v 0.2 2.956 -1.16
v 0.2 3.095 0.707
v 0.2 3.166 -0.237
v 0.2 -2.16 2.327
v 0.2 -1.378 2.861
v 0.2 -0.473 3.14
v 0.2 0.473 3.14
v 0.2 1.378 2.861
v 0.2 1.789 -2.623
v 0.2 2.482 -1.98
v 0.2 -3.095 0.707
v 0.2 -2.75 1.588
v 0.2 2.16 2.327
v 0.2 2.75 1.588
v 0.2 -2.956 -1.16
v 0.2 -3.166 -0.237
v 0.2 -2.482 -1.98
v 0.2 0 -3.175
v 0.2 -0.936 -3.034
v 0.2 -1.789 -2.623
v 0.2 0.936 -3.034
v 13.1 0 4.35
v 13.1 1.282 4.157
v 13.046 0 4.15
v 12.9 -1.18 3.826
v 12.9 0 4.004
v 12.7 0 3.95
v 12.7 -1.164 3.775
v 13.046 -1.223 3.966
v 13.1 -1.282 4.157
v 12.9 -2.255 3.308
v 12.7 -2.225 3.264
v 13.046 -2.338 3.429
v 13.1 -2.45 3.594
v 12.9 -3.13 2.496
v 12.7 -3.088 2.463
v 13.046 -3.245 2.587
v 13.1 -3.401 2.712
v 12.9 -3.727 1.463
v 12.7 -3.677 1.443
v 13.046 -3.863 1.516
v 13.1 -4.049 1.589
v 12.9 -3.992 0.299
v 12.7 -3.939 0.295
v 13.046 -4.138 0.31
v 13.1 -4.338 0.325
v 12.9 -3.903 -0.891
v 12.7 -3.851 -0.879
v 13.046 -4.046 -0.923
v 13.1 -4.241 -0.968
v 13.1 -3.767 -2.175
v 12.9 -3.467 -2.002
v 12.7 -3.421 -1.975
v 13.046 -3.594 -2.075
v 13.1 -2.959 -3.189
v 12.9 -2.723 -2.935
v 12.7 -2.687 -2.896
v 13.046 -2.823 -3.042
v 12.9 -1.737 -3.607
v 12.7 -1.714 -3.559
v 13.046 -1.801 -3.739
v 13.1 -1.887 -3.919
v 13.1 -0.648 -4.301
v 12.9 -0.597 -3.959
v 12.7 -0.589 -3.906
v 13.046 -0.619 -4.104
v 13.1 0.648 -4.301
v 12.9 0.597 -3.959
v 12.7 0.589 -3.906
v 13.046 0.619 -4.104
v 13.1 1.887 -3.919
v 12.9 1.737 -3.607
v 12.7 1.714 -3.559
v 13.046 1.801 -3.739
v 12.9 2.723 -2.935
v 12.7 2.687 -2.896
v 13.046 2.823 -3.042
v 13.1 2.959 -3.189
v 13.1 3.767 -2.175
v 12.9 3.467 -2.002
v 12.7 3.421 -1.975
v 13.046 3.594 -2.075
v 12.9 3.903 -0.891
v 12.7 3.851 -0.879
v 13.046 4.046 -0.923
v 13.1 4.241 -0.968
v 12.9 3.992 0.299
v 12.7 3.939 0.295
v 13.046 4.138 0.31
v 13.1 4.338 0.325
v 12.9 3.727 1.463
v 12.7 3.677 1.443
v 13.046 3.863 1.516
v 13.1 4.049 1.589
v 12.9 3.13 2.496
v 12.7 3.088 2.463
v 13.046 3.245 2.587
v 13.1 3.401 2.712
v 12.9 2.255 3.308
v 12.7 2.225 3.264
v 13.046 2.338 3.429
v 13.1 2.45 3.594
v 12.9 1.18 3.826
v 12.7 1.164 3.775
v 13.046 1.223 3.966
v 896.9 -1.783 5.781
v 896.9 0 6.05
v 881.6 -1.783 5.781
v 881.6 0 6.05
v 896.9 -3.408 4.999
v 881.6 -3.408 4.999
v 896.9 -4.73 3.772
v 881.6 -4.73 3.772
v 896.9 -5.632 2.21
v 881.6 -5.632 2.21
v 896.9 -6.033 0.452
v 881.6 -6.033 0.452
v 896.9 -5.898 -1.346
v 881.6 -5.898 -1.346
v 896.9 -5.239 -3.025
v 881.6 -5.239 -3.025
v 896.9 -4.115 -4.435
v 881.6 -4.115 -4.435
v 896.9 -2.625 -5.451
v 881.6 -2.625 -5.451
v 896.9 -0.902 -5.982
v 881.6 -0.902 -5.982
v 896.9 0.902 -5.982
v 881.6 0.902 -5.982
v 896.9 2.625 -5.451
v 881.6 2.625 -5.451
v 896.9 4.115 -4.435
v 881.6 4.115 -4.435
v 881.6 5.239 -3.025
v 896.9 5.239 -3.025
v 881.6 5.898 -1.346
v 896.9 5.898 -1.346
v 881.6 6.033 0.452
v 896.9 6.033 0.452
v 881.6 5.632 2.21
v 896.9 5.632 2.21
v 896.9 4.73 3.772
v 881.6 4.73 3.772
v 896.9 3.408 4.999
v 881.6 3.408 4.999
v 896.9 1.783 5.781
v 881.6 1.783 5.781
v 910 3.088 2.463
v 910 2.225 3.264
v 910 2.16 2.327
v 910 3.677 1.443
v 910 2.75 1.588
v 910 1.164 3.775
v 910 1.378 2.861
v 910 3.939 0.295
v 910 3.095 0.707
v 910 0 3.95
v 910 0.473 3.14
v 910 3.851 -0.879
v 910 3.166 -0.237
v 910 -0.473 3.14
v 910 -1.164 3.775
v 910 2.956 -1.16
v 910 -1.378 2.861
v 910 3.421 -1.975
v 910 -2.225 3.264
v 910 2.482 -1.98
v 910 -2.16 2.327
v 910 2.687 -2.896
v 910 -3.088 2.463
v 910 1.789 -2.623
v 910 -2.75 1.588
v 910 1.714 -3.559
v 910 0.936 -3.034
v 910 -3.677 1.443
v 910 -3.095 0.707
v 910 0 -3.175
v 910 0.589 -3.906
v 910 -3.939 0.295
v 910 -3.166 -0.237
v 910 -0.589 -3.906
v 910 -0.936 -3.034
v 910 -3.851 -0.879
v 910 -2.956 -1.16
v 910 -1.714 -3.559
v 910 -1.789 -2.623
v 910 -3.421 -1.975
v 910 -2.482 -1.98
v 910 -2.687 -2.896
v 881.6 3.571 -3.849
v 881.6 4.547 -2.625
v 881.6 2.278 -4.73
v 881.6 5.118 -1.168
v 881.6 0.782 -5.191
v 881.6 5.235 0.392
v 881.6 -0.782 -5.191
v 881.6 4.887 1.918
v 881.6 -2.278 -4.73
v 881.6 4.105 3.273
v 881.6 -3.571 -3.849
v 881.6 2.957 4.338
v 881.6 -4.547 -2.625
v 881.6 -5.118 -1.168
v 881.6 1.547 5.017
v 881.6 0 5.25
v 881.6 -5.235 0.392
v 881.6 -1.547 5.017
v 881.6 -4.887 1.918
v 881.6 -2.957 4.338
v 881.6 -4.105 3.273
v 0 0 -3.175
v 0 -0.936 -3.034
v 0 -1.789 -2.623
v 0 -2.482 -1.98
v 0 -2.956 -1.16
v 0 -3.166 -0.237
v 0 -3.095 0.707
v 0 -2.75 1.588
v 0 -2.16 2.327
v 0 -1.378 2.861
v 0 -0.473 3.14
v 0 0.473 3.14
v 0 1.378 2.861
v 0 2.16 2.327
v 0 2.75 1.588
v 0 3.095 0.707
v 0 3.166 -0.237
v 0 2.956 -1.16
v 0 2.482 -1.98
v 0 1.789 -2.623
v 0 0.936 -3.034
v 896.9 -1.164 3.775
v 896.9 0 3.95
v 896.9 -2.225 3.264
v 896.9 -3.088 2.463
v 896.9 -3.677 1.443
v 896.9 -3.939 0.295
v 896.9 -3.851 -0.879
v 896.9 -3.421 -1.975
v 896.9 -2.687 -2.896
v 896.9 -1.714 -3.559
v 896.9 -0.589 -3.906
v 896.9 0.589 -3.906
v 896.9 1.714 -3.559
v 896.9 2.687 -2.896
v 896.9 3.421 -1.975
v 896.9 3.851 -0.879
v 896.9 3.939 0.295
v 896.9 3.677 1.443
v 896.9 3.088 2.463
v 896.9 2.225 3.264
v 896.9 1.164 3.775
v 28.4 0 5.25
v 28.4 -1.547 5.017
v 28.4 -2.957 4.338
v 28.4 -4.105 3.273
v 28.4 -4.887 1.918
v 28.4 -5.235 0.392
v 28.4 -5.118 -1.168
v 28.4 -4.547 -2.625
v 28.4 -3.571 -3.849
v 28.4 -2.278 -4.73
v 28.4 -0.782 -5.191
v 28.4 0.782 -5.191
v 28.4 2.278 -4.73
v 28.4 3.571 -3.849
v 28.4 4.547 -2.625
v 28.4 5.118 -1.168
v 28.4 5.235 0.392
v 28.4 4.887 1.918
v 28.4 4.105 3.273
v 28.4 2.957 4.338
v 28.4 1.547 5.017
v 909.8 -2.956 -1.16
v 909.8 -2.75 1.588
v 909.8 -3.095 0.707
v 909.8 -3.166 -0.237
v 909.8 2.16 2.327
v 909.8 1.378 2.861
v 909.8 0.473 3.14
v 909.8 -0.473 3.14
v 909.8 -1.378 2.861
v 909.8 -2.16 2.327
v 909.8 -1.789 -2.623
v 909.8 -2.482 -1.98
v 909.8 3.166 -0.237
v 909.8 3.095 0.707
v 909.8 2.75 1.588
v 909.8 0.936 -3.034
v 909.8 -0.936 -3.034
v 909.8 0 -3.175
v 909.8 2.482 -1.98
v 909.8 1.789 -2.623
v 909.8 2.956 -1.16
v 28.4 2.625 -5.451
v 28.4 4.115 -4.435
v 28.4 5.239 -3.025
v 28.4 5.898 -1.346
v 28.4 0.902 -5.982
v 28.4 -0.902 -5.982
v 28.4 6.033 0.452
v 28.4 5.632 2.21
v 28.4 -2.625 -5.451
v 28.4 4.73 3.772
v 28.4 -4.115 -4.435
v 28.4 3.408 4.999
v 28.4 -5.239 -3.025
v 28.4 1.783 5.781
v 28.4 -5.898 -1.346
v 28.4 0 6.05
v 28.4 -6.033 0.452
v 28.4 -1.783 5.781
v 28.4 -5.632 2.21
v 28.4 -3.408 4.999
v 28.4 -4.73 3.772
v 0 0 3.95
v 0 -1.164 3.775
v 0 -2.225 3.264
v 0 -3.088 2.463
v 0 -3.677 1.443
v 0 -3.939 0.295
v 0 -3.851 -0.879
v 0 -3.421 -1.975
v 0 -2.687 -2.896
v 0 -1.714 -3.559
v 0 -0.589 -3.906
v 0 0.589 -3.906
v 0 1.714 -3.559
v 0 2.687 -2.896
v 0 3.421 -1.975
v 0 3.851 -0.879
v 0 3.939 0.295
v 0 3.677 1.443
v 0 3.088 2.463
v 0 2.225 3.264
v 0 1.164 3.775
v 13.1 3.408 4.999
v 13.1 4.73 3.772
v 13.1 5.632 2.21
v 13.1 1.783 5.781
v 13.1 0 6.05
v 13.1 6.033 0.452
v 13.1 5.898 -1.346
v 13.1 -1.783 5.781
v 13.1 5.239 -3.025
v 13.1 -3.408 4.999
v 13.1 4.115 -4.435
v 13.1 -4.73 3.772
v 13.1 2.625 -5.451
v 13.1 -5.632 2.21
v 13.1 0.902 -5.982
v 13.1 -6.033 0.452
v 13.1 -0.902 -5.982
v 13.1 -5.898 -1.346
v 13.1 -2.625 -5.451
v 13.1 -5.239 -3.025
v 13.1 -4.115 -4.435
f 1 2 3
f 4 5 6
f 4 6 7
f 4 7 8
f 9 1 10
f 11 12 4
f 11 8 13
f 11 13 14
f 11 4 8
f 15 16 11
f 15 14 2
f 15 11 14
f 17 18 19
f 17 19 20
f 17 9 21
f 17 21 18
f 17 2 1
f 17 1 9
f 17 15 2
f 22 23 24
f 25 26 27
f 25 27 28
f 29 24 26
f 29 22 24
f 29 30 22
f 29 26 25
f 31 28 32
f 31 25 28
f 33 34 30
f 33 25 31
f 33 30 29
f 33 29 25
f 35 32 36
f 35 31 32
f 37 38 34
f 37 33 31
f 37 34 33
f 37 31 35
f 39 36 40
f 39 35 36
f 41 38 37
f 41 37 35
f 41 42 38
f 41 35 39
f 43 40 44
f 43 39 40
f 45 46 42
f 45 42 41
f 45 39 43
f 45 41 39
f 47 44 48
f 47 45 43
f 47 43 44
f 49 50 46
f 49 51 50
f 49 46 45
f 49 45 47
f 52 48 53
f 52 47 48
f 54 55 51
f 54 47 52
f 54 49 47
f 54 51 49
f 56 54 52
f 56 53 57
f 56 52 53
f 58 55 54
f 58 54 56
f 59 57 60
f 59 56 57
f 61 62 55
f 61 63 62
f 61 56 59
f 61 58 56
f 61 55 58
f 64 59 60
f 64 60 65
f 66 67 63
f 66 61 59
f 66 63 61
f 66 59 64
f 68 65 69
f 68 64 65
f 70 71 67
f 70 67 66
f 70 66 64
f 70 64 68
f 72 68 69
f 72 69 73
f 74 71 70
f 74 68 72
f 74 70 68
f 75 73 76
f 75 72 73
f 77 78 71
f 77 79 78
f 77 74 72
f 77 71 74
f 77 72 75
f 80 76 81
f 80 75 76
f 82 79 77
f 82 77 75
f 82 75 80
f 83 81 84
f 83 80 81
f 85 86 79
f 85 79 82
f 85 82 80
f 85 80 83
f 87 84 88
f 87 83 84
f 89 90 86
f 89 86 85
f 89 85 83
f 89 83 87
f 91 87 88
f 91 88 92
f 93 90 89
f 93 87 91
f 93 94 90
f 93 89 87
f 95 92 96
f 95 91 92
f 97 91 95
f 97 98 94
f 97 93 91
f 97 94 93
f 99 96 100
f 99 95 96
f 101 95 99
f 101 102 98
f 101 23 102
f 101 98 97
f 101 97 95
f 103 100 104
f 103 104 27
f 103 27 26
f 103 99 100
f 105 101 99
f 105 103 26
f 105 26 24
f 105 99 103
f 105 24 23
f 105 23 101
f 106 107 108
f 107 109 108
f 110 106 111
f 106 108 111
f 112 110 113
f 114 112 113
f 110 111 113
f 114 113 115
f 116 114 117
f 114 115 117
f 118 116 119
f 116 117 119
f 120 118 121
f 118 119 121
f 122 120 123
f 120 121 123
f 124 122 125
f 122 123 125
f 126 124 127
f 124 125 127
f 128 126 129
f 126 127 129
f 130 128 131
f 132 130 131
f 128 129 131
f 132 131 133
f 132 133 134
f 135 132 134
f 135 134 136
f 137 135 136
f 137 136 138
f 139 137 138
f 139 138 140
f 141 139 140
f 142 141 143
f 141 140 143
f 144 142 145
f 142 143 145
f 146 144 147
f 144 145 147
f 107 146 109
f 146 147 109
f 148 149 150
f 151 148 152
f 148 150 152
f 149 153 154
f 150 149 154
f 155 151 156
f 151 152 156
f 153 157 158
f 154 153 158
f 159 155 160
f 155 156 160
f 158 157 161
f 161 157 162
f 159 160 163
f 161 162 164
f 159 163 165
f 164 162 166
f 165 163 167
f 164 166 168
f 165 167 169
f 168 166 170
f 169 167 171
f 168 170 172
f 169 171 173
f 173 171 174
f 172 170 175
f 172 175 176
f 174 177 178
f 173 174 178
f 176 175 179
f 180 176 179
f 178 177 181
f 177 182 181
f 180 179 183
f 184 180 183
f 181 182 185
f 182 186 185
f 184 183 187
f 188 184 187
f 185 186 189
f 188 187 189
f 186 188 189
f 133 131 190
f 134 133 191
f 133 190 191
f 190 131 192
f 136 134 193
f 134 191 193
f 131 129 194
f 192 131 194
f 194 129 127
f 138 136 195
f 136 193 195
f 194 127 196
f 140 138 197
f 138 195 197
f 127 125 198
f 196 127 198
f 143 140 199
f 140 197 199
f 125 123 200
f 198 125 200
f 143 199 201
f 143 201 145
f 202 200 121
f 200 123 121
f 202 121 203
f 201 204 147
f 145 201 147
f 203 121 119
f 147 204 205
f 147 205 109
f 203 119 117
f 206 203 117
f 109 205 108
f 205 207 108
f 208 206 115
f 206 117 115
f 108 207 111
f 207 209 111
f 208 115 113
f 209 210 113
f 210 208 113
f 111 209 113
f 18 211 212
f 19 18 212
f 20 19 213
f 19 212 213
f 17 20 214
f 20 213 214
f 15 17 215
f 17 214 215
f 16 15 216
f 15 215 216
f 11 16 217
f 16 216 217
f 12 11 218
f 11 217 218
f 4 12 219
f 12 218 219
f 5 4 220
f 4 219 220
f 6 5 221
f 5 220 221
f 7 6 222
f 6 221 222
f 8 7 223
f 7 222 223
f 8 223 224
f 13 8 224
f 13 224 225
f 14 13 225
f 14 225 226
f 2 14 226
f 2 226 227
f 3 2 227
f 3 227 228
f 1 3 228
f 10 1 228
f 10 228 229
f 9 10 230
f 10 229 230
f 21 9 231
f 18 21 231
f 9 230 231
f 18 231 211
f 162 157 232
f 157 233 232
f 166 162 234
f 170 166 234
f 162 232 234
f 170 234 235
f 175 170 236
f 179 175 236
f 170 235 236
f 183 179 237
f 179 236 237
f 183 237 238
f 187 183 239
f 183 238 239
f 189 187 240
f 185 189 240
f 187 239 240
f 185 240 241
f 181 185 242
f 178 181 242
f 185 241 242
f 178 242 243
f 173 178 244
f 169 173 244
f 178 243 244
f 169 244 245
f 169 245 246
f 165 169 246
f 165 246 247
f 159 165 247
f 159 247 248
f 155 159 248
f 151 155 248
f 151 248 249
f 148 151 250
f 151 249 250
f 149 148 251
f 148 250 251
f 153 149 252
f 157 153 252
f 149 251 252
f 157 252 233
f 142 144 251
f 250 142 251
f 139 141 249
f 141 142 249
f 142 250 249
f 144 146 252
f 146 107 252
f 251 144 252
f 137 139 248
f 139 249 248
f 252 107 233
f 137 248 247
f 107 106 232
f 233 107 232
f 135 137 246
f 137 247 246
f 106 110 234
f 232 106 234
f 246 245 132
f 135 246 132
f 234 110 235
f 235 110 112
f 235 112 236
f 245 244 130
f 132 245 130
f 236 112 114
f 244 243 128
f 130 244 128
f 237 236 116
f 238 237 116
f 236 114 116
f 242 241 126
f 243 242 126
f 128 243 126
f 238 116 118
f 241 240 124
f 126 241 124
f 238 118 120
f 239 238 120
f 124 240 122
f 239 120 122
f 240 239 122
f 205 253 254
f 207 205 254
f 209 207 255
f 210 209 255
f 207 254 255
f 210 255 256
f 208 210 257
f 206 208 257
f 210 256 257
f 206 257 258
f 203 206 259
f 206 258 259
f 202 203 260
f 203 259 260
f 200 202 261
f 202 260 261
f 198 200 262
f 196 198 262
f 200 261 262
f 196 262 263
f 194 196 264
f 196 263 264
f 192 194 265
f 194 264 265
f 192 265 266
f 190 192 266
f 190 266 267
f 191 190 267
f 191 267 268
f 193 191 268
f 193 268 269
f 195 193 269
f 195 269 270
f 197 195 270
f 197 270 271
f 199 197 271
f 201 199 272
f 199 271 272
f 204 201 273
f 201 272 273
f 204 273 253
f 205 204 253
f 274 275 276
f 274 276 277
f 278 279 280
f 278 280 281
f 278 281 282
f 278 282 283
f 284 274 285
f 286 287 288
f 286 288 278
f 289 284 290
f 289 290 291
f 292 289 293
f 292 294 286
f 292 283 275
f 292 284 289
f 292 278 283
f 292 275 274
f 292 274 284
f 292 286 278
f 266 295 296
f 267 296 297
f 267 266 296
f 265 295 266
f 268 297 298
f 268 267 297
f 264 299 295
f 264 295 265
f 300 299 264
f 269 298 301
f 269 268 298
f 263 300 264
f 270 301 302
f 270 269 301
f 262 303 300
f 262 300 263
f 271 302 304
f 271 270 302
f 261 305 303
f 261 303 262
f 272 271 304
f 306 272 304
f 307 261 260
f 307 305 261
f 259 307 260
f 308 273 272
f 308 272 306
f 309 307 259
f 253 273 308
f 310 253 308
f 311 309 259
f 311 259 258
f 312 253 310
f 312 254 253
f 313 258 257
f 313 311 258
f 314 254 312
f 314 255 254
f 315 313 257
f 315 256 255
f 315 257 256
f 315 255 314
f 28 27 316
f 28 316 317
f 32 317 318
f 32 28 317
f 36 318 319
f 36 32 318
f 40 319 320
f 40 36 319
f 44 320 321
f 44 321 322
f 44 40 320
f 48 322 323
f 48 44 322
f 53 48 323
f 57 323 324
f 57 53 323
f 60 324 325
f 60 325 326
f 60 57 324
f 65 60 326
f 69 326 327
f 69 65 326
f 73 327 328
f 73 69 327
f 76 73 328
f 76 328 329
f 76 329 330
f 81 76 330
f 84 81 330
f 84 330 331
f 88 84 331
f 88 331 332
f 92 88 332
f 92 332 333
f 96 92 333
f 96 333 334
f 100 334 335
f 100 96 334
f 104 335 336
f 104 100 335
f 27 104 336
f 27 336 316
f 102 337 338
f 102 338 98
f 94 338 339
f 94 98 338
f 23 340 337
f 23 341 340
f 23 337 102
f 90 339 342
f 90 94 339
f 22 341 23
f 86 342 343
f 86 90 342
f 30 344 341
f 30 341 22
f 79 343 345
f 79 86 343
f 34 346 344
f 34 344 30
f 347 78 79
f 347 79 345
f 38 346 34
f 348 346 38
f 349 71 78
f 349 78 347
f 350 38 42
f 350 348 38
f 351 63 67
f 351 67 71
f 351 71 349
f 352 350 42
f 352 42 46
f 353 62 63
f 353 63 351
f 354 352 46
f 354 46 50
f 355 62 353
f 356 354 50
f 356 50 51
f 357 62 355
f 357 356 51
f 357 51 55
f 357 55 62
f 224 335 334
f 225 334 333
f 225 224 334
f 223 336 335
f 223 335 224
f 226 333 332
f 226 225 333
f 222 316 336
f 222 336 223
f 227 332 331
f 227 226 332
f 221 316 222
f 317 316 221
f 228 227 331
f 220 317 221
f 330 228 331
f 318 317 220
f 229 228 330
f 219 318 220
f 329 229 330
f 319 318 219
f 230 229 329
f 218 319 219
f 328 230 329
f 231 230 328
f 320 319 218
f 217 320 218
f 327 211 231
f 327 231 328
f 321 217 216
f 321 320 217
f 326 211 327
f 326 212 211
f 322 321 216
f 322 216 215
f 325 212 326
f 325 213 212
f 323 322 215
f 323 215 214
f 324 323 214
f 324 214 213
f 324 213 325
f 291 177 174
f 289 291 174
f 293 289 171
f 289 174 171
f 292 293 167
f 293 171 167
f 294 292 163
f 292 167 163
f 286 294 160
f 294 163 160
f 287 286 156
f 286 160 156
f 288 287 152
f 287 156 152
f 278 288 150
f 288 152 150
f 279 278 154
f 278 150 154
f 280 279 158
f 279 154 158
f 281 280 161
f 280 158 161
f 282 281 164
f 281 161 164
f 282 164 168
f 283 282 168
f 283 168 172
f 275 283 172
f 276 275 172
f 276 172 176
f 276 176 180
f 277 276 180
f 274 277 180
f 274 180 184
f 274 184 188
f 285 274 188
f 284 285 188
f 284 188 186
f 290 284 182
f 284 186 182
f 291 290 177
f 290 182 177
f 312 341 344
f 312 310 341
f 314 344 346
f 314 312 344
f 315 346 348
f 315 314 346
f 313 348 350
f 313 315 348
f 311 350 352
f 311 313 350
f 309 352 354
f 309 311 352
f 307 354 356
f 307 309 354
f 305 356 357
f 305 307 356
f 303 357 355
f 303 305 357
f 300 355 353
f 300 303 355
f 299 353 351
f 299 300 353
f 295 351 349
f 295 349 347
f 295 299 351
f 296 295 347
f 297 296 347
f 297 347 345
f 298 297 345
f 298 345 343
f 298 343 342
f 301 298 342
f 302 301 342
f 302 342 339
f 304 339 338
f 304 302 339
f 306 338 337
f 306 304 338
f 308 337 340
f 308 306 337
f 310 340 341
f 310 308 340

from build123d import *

# Parameters (mm, degrees)
FILLET1_R           = 0.4
SKETCH6_R           = 5.25
BOSS_EXTRUDE1_DEPTH = 853.2
SKETCH7_R           = 3.175
CUT_EXTRUDE1_DEPTH  = 0.2
SKETCH9_R           = 3.175
CUT_EXTRUDE2_DEPTH  = 0.2


with BuildPart() as part:
    # Sketch3 → Revolve1 (revolve)
    with BuildSketch(Plane.XY, mode=Mode.PRIVATE) as revolve1_sk:
        Polygon((0, 0), (0, 3.95), (13.1, 3.95), (13.1, 6.05), (28.4, 6.05), (28.4, 0), align=None)
    revolve1 = revolve(revolve1_sk.sketch.rotate(Axis((0, 0, 0), (1, 0, 0)), 90), axis=Axis((0, 0, 0), (1, 0, 0)))  # turned: the seam where the file's is

    # Fillet1
    fillet1_edges = [part.edges().sort_by_distance(p)[0] for p in [
        (13.1, 0, -3.95),
    ]]
    fillet(fillet1_edges, radius=FILLET1_R)

    # Sketch6 → Boss-Extrude1 (add)
    with BuildSketch(Plane(origin=(28.4, 0, 0), x_dir=(0, 0, -1), z_dir=(1, 0, 0))):
        with Locations(Location((0, 0, 0), (0, 0, 180))):  # turned: the seam where the file's is
            Circle(SKETCH6_R)
    extrude(amount=BOSS_EXTRUDE1_DEPTH)

    # Mirror1: Revolve1 across plane
    add(revolve1.mirror(Plane(origin=(455, 0, 0), x_dir=(0, 0, 1), z_dir=(1, 0, 0))))

    # Sketch7 → Cut-Extrude1 (cut)
    with BuildSketch(Plane(origin=(910, 0, 0), x_dir=(0, 0, -1), z_dir=(1, 0, 0))):
        Circle(SKETCH7_R)
    extrude(amount=-CUT_EXTRUDE1_DEPTH, mode=Mode.SUBTRACT)

    # Sketch9 → Cut-Extrude2 (cut)
    with BuildSketch(Plane.ZY):
        with Locations(Location((0, 0, 0), (0, 0, 180))):  # turned: the seam where the file's is
            Circle(SKETCH9_R)
    extrude(amount=-CUT_EXTRUDE2_DEPTH, mode=Mode.SUBTRACT)


solid = part.part
